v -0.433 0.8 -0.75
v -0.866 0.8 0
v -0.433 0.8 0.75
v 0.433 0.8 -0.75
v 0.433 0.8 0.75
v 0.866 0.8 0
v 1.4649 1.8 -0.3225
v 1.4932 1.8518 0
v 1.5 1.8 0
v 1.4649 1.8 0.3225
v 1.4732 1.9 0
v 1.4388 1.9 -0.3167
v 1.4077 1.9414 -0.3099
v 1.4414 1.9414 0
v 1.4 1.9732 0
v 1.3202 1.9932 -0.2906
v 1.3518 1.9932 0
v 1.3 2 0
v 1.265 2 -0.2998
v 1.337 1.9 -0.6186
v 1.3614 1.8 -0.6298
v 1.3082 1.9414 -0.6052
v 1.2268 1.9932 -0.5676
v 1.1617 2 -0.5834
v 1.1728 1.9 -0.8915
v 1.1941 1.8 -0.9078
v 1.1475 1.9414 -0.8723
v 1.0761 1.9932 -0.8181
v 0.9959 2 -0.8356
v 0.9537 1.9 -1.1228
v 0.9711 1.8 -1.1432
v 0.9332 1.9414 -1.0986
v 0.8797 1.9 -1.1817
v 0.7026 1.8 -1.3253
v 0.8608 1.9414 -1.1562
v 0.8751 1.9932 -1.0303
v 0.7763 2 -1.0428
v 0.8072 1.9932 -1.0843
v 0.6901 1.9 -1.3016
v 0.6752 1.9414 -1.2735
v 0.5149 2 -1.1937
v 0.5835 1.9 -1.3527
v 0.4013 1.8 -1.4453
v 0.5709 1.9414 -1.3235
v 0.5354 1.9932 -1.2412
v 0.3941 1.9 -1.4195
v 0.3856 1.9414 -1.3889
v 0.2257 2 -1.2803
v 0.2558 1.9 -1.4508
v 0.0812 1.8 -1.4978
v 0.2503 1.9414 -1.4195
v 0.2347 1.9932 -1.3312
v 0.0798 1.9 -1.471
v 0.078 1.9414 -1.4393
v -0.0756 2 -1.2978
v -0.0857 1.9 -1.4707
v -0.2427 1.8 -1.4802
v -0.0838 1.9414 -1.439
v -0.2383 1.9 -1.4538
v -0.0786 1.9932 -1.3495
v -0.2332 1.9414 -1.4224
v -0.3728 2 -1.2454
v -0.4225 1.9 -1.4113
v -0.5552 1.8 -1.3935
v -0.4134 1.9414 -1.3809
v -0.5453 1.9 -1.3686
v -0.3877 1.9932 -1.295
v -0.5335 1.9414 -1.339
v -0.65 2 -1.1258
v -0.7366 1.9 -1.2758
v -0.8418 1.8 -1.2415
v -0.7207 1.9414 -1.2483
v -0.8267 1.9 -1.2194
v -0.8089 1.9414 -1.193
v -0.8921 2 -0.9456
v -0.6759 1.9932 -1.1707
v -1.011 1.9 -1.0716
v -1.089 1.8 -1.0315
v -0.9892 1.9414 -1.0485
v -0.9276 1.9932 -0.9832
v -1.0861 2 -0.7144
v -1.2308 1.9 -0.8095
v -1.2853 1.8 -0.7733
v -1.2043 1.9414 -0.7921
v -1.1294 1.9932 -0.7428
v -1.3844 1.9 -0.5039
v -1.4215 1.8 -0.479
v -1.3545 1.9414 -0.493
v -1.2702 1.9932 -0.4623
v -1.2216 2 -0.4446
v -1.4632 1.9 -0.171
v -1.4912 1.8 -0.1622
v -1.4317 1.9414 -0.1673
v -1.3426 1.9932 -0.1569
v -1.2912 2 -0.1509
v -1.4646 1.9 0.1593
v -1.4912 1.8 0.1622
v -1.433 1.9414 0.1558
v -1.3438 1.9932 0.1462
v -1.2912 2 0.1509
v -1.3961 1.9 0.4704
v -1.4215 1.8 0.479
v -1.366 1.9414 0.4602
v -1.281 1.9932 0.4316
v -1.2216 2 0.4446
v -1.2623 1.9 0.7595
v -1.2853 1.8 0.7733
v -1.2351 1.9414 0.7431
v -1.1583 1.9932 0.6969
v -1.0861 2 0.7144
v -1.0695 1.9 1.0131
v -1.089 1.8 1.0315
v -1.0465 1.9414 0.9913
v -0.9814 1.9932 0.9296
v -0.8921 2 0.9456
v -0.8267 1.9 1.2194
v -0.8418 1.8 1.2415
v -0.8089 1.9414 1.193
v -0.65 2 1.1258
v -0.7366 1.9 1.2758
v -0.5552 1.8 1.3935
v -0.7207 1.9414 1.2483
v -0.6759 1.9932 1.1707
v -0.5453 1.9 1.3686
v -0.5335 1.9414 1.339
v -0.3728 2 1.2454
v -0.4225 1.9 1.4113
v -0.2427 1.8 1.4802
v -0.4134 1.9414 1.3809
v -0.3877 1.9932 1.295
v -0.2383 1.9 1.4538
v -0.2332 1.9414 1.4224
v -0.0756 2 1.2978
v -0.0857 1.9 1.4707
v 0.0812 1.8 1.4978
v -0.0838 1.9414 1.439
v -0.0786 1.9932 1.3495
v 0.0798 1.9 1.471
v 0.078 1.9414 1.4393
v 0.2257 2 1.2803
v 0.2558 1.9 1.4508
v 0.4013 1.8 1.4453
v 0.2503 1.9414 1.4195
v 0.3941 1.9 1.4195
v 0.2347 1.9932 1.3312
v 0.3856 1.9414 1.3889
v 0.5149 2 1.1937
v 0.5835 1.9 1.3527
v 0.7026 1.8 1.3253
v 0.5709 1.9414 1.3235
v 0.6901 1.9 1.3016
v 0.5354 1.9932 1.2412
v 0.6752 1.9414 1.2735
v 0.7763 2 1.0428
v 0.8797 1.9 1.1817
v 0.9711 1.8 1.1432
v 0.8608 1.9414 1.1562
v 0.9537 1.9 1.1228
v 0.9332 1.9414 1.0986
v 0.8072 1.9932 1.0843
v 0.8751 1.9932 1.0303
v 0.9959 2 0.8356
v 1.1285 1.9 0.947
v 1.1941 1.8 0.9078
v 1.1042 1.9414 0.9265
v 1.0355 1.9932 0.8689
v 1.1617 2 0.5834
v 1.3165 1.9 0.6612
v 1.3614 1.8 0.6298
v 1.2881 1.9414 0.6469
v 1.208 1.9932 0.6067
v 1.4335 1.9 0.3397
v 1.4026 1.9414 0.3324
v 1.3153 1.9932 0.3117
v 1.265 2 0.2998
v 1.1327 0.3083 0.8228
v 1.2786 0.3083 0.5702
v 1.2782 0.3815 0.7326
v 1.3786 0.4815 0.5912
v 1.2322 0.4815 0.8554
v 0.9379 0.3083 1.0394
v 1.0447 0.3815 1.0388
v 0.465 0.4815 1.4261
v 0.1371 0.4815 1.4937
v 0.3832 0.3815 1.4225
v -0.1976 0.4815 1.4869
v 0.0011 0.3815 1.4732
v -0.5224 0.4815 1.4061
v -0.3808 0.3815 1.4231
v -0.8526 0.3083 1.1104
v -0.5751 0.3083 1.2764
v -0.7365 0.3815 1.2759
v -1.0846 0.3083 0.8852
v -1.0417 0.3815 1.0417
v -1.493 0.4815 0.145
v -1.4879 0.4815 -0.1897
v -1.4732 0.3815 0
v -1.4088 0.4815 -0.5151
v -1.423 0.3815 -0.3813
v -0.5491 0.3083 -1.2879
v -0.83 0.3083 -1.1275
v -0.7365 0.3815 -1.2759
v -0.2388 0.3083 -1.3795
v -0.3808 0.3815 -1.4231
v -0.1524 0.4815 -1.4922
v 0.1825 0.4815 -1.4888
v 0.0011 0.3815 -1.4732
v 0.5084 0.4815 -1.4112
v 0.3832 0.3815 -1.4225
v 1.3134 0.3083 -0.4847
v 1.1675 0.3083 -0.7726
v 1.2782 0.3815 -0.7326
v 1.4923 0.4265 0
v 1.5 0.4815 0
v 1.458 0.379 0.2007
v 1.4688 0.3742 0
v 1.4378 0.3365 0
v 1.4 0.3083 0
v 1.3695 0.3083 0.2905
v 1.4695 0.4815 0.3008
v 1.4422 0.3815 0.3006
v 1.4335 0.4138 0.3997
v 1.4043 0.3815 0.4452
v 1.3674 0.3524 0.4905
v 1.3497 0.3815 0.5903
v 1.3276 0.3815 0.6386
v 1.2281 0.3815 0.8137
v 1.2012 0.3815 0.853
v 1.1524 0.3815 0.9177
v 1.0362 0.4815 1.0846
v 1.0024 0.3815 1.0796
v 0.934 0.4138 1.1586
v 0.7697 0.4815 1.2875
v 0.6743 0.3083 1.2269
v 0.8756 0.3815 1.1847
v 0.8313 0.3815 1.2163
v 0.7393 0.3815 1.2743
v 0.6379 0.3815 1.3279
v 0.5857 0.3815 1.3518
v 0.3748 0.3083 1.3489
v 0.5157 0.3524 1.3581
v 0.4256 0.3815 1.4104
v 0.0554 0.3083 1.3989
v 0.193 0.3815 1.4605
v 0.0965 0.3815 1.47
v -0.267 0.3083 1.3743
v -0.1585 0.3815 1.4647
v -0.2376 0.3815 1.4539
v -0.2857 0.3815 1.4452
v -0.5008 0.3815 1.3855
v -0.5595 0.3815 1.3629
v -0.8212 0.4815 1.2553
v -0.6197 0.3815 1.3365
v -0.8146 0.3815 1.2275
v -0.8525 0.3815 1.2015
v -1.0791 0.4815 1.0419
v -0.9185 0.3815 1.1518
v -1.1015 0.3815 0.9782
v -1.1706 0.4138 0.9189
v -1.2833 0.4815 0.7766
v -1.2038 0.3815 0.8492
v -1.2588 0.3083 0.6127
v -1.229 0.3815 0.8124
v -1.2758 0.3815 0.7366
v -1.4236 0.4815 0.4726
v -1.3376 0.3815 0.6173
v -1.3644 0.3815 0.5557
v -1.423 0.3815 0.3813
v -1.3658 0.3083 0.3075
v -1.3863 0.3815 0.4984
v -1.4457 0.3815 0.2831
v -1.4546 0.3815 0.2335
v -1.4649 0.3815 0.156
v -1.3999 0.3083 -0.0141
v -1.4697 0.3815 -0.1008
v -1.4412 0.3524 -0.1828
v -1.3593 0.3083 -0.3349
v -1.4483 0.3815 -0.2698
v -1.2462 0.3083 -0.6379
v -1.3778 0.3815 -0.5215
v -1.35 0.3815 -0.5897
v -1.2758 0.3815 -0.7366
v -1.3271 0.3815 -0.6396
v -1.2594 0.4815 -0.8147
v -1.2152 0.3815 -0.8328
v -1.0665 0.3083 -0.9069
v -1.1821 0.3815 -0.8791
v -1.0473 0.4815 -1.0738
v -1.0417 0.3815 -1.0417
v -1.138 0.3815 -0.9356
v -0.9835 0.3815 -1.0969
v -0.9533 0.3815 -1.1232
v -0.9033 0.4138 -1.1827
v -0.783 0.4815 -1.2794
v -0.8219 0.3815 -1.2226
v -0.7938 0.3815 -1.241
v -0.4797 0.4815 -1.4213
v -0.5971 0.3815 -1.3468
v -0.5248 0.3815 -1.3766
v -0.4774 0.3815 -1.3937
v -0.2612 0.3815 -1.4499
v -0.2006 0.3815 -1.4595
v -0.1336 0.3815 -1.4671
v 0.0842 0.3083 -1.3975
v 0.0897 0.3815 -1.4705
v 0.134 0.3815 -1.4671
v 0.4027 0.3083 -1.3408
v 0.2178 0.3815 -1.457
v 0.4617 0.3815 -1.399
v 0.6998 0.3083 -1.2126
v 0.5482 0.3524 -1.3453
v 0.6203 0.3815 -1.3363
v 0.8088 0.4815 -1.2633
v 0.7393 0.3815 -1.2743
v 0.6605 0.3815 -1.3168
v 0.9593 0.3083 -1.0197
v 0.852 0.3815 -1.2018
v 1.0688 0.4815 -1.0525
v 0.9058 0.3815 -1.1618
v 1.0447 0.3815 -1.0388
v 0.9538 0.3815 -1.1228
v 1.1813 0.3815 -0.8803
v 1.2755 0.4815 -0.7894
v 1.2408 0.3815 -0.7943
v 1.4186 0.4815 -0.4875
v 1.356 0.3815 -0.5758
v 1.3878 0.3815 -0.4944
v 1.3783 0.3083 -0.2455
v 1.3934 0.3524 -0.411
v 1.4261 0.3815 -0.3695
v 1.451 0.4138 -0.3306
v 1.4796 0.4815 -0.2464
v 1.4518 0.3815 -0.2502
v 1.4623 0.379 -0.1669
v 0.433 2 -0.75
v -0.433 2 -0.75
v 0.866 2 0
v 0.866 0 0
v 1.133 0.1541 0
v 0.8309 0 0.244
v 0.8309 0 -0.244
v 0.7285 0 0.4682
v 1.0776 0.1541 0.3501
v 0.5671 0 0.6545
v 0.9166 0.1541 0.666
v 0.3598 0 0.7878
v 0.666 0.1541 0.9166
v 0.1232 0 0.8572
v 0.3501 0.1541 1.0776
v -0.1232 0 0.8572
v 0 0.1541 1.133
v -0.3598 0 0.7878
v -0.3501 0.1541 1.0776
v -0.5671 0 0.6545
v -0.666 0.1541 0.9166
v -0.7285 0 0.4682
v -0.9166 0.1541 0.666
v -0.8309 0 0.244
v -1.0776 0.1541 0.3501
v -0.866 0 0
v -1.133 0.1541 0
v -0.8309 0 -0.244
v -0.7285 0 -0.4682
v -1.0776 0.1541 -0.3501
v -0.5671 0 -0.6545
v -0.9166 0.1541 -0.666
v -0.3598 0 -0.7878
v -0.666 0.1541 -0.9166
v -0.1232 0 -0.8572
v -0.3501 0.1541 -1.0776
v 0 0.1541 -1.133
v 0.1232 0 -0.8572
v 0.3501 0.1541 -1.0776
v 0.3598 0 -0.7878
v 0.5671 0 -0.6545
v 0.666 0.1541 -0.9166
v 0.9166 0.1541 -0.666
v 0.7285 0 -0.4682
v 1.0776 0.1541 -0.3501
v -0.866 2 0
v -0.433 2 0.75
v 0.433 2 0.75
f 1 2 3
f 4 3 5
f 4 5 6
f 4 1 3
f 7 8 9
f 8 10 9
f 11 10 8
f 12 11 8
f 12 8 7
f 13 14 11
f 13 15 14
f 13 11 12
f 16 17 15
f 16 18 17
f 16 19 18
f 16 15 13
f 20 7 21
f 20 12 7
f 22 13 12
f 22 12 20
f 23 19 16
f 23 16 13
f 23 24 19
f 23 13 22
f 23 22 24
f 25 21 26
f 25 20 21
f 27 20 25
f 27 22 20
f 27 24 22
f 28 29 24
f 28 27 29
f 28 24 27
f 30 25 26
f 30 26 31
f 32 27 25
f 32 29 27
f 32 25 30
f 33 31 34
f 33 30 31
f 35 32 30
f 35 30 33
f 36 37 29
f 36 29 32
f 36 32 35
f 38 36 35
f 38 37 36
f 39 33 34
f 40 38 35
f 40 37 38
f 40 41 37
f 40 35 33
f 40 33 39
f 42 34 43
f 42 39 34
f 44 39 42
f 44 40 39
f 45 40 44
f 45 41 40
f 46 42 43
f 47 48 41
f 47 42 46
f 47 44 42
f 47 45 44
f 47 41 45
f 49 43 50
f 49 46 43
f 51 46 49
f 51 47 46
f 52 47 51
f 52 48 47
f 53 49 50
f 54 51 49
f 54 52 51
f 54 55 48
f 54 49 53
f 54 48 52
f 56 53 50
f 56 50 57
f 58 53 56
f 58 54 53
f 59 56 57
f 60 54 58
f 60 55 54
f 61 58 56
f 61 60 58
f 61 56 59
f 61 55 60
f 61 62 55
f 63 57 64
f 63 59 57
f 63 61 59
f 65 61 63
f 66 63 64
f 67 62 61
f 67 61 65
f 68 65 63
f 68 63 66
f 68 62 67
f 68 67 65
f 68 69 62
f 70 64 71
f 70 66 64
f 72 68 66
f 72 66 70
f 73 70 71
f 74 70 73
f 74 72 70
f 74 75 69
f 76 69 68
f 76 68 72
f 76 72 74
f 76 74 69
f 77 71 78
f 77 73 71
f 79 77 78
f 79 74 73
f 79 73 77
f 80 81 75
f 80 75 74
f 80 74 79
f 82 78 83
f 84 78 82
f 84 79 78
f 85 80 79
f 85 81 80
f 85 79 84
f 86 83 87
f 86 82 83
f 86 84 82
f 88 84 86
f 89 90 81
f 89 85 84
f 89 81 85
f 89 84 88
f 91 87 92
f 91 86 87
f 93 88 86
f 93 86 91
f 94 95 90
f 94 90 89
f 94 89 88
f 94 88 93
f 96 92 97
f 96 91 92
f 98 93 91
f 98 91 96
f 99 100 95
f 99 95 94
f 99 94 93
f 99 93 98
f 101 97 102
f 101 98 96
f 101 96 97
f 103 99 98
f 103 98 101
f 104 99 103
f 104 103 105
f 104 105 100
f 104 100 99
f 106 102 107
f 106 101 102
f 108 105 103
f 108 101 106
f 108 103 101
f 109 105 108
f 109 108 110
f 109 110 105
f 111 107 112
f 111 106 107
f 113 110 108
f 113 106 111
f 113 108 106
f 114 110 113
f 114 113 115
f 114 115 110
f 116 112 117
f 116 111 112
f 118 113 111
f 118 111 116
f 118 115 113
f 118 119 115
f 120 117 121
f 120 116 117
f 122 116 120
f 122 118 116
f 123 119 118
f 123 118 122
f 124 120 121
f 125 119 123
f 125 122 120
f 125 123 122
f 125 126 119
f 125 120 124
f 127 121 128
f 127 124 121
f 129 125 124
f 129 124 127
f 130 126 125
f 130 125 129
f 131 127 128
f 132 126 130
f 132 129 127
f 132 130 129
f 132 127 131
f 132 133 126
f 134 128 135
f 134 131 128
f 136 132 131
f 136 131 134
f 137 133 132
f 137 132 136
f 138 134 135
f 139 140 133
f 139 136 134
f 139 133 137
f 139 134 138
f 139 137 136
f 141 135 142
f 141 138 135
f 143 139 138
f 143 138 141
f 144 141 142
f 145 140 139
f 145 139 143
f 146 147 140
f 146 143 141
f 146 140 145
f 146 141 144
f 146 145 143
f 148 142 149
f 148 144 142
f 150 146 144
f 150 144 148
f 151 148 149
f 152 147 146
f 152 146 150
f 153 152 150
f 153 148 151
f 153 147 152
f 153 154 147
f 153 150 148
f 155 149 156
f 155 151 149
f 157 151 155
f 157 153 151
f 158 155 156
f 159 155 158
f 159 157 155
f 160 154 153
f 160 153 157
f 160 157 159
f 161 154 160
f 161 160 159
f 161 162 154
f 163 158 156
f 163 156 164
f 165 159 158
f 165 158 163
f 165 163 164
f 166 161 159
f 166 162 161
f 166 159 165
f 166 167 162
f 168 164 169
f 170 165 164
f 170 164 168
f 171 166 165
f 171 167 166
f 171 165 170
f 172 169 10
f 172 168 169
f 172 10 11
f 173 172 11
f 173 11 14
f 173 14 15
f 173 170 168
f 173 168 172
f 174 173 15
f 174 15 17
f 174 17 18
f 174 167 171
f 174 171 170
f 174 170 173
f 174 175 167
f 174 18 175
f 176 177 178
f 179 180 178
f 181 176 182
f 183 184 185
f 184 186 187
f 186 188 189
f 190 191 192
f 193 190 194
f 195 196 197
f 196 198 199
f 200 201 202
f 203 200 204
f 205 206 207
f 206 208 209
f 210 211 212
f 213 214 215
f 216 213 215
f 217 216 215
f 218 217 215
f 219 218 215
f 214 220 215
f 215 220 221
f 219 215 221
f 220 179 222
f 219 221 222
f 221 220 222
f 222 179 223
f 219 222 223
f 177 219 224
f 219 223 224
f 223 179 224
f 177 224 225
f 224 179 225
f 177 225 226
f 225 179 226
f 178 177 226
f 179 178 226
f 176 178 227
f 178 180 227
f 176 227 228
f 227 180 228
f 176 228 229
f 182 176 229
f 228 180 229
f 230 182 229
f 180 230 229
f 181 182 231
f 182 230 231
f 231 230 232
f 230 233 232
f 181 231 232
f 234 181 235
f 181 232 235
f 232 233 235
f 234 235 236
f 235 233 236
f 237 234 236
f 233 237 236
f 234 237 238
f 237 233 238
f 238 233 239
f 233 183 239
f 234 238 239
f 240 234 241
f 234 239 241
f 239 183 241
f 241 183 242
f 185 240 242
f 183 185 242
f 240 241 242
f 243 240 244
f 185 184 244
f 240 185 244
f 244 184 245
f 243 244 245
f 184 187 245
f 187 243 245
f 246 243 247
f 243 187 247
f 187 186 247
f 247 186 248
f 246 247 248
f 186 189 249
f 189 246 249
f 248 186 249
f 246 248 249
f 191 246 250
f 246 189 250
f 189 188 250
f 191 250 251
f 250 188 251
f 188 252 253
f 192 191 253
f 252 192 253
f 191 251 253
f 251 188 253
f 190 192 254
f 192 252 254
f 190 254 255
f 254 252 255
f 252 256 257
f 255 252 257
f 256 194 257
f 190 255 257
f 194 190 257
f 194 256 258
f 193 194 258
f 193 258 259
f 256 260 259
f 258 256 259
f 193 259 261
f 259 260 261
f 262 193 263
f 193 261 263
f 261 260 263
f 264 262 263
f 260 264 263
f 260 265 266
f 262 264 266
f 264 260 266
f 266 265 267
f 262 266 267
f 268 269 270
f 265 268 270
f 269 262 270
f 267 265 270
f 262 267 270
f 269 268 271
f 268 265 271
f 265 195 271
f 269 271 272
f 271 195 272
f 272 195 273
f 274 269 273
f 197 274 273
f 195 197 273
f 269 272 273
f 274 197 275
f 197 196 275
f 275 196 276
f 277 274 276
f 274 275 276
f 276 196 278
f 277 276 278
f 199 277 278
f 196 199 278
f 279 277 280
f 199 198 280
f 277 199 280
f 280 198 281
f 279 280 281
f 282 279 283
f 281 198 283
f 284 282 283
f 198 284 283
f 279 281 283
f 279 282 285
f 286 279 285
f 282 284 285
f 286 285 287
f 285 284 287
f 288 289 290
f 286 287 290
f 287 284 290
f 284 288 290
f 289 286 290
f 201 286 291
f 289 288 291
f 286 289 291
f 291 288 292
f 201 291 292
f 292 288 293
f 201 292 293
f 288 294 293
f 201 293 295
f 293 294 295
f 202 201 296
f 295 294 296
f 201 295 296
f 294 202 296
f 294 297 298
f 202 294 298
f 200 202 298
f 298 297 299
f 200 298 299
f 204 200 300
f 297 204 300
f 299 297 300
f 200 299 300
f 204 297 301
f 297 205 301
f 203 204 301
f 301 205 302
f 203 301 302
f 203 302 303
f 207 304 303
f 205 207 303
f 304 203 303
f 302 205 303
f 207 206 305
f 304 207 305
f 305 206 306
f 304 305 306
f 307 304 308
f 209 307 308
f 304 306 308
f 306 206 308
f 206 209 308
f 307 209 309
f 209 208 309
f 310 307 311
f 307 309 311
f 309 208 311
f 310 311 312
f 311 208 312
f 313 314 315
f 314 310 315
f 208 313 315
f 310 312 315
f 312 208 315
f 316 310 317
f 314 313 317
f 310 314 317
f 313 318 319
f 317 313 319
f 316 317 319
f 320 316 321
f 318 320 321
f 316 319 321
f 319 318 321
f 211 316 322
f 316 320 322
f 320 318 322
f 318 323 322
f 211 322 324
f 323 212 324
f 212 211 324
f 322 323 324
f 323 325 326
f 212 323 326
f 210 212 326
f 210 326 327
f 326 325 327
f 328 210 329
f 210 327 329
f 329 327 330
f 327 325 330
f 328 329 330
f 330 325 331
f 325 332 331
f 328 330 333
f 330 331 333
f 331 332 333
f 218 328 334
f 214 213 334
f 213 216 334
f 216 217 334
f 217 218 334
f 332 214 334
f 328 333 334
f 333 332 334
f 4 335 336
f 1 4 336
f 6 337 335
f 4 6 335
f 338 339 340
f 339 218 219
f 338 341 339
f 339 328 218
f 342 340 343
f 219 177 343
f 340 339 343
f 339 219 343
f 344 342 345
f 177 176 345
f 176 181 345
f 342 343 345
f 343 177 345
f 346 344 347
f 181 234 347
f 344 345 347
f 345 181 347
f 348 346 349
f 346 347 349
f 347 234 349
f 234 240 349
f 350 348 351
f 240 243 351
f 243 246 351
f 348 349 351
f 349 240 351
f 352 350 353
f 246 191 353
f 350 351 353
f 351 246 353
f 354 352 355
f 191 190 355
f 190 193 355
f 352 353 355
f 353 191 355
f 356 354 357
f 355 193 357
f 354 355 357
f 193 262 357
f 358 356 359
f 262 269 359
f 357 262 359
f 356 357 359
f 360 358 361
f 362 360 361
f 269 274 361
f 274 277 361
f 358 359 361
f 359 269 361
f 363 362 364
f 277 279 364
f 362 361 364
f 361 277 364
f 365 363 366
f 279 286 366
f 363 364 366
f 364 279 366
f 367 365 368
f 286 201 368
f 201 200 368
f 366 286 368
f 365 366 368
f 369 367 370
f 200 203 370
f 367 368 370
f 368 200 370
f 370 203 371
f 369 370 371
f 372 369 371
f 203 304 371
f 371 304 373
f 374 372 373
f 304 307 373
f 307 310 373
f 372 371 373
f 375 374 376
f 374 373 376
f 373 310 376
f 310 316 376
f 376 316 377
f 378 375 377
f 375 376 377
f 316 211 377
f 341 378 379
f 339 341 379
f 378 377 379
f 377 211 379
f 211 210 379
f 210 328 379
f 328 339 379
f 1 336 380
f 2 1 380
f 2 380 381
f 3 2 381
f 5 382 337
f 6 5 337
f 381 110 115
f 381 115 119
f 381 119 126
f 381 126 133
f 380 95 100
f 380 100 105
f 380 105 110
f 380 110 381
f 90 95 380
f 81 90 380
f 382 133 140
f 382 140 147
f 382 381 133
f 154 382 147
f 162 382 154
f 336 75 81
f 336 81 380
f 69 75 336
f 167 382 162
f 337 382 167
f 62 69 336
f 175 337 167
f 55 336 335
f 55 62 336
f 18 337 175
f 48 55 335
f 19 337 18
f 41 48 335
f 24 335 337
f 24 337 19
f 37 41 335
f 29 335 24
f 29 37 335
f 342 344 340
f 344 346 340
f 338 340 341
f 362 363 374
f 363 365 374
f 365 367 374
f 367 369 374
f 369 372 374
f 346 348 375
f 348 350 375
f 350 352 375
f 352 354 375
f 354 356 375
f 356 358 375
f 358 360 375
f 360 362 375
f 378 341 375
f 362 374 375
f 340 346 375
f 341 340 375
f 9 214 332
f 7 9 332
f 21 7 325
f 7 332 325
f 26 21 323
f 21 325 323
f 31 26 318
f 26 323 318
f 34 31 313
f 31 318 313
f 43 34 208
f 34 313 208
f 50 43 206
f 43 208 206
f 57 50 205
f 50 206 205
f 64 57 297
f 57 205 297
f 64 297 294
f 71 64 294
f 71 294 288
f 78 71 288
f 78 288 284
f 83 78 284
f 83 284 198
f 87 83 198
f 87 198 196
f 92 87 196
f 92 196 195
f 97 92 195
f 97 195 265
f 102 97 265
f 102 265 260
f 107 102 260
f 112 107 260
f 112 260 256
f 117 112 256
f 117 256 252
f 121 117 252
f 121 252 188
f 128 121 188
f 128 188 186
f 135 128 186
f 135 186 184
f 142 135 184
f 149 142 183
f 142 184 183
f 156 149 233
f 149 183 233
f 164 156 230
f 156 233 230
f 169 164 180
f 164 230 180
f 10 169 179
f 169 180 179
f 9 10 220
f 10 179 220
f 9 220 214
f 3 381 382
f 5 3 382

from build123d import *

# Parameters (mm, degrees)
SKETCH_1_R            = 1.5
EXTRUDE_254_DEPTH     = 2
CUT_EXTRUDE_388_DEPTH = 1.2
FILLET_1_R            = 0.2


with BuildPart() as part:
    # 草图1 → Extrude 254 (new body)
    with BuildSketch(Plane(origin=(0, 0, 0), x_dir=(1, 0, 0), z_dir=(0, 1, 0))):
        Circle(SKETCH_1_R)
    extrude(amount=EXTRUDE_254_DEPTH)

    # 草图2 → Cut-Extrude 388 (cut)
    with BuildSketch(Plane(origin=(0, 2, 0), x_dir=(1, 0, 0), z_dir=(0, 1, 0))):
        Polygon((0.866025404, 0), (0.433012702, 0.75), (-0.433012702, 0.75), (-0.866025404, 0), (-0.433012702, -0.75), (0.433012702, -0.75), align=None)
    extrude(amount=-CUT_EXTRUDE_388_DEPTH, mode=Mode.SUBTRACT)

    # 草图3 → 切除-旋转4 (revolve, cut)
    with BuildSketch(Plane.XY):
        Polygon((0.866025404, 0), (1.5, 0.366025404), (1.5, 0), align=None)
    revolve(axis=Axis((0, 2, 0), (0, -1, 0)), mode=Mode.SUBTRACT)

    # 圆角1
    fillet_1_edges = [part.edges().sort_by_distance(p)[0] for p in [
        (-1.5, 0.366025404, 0),
        (-1.5, 2, 0),
    ]]
    fillet(fillet_1_edges, radius=FILLET_1_R)


solid = part.part
